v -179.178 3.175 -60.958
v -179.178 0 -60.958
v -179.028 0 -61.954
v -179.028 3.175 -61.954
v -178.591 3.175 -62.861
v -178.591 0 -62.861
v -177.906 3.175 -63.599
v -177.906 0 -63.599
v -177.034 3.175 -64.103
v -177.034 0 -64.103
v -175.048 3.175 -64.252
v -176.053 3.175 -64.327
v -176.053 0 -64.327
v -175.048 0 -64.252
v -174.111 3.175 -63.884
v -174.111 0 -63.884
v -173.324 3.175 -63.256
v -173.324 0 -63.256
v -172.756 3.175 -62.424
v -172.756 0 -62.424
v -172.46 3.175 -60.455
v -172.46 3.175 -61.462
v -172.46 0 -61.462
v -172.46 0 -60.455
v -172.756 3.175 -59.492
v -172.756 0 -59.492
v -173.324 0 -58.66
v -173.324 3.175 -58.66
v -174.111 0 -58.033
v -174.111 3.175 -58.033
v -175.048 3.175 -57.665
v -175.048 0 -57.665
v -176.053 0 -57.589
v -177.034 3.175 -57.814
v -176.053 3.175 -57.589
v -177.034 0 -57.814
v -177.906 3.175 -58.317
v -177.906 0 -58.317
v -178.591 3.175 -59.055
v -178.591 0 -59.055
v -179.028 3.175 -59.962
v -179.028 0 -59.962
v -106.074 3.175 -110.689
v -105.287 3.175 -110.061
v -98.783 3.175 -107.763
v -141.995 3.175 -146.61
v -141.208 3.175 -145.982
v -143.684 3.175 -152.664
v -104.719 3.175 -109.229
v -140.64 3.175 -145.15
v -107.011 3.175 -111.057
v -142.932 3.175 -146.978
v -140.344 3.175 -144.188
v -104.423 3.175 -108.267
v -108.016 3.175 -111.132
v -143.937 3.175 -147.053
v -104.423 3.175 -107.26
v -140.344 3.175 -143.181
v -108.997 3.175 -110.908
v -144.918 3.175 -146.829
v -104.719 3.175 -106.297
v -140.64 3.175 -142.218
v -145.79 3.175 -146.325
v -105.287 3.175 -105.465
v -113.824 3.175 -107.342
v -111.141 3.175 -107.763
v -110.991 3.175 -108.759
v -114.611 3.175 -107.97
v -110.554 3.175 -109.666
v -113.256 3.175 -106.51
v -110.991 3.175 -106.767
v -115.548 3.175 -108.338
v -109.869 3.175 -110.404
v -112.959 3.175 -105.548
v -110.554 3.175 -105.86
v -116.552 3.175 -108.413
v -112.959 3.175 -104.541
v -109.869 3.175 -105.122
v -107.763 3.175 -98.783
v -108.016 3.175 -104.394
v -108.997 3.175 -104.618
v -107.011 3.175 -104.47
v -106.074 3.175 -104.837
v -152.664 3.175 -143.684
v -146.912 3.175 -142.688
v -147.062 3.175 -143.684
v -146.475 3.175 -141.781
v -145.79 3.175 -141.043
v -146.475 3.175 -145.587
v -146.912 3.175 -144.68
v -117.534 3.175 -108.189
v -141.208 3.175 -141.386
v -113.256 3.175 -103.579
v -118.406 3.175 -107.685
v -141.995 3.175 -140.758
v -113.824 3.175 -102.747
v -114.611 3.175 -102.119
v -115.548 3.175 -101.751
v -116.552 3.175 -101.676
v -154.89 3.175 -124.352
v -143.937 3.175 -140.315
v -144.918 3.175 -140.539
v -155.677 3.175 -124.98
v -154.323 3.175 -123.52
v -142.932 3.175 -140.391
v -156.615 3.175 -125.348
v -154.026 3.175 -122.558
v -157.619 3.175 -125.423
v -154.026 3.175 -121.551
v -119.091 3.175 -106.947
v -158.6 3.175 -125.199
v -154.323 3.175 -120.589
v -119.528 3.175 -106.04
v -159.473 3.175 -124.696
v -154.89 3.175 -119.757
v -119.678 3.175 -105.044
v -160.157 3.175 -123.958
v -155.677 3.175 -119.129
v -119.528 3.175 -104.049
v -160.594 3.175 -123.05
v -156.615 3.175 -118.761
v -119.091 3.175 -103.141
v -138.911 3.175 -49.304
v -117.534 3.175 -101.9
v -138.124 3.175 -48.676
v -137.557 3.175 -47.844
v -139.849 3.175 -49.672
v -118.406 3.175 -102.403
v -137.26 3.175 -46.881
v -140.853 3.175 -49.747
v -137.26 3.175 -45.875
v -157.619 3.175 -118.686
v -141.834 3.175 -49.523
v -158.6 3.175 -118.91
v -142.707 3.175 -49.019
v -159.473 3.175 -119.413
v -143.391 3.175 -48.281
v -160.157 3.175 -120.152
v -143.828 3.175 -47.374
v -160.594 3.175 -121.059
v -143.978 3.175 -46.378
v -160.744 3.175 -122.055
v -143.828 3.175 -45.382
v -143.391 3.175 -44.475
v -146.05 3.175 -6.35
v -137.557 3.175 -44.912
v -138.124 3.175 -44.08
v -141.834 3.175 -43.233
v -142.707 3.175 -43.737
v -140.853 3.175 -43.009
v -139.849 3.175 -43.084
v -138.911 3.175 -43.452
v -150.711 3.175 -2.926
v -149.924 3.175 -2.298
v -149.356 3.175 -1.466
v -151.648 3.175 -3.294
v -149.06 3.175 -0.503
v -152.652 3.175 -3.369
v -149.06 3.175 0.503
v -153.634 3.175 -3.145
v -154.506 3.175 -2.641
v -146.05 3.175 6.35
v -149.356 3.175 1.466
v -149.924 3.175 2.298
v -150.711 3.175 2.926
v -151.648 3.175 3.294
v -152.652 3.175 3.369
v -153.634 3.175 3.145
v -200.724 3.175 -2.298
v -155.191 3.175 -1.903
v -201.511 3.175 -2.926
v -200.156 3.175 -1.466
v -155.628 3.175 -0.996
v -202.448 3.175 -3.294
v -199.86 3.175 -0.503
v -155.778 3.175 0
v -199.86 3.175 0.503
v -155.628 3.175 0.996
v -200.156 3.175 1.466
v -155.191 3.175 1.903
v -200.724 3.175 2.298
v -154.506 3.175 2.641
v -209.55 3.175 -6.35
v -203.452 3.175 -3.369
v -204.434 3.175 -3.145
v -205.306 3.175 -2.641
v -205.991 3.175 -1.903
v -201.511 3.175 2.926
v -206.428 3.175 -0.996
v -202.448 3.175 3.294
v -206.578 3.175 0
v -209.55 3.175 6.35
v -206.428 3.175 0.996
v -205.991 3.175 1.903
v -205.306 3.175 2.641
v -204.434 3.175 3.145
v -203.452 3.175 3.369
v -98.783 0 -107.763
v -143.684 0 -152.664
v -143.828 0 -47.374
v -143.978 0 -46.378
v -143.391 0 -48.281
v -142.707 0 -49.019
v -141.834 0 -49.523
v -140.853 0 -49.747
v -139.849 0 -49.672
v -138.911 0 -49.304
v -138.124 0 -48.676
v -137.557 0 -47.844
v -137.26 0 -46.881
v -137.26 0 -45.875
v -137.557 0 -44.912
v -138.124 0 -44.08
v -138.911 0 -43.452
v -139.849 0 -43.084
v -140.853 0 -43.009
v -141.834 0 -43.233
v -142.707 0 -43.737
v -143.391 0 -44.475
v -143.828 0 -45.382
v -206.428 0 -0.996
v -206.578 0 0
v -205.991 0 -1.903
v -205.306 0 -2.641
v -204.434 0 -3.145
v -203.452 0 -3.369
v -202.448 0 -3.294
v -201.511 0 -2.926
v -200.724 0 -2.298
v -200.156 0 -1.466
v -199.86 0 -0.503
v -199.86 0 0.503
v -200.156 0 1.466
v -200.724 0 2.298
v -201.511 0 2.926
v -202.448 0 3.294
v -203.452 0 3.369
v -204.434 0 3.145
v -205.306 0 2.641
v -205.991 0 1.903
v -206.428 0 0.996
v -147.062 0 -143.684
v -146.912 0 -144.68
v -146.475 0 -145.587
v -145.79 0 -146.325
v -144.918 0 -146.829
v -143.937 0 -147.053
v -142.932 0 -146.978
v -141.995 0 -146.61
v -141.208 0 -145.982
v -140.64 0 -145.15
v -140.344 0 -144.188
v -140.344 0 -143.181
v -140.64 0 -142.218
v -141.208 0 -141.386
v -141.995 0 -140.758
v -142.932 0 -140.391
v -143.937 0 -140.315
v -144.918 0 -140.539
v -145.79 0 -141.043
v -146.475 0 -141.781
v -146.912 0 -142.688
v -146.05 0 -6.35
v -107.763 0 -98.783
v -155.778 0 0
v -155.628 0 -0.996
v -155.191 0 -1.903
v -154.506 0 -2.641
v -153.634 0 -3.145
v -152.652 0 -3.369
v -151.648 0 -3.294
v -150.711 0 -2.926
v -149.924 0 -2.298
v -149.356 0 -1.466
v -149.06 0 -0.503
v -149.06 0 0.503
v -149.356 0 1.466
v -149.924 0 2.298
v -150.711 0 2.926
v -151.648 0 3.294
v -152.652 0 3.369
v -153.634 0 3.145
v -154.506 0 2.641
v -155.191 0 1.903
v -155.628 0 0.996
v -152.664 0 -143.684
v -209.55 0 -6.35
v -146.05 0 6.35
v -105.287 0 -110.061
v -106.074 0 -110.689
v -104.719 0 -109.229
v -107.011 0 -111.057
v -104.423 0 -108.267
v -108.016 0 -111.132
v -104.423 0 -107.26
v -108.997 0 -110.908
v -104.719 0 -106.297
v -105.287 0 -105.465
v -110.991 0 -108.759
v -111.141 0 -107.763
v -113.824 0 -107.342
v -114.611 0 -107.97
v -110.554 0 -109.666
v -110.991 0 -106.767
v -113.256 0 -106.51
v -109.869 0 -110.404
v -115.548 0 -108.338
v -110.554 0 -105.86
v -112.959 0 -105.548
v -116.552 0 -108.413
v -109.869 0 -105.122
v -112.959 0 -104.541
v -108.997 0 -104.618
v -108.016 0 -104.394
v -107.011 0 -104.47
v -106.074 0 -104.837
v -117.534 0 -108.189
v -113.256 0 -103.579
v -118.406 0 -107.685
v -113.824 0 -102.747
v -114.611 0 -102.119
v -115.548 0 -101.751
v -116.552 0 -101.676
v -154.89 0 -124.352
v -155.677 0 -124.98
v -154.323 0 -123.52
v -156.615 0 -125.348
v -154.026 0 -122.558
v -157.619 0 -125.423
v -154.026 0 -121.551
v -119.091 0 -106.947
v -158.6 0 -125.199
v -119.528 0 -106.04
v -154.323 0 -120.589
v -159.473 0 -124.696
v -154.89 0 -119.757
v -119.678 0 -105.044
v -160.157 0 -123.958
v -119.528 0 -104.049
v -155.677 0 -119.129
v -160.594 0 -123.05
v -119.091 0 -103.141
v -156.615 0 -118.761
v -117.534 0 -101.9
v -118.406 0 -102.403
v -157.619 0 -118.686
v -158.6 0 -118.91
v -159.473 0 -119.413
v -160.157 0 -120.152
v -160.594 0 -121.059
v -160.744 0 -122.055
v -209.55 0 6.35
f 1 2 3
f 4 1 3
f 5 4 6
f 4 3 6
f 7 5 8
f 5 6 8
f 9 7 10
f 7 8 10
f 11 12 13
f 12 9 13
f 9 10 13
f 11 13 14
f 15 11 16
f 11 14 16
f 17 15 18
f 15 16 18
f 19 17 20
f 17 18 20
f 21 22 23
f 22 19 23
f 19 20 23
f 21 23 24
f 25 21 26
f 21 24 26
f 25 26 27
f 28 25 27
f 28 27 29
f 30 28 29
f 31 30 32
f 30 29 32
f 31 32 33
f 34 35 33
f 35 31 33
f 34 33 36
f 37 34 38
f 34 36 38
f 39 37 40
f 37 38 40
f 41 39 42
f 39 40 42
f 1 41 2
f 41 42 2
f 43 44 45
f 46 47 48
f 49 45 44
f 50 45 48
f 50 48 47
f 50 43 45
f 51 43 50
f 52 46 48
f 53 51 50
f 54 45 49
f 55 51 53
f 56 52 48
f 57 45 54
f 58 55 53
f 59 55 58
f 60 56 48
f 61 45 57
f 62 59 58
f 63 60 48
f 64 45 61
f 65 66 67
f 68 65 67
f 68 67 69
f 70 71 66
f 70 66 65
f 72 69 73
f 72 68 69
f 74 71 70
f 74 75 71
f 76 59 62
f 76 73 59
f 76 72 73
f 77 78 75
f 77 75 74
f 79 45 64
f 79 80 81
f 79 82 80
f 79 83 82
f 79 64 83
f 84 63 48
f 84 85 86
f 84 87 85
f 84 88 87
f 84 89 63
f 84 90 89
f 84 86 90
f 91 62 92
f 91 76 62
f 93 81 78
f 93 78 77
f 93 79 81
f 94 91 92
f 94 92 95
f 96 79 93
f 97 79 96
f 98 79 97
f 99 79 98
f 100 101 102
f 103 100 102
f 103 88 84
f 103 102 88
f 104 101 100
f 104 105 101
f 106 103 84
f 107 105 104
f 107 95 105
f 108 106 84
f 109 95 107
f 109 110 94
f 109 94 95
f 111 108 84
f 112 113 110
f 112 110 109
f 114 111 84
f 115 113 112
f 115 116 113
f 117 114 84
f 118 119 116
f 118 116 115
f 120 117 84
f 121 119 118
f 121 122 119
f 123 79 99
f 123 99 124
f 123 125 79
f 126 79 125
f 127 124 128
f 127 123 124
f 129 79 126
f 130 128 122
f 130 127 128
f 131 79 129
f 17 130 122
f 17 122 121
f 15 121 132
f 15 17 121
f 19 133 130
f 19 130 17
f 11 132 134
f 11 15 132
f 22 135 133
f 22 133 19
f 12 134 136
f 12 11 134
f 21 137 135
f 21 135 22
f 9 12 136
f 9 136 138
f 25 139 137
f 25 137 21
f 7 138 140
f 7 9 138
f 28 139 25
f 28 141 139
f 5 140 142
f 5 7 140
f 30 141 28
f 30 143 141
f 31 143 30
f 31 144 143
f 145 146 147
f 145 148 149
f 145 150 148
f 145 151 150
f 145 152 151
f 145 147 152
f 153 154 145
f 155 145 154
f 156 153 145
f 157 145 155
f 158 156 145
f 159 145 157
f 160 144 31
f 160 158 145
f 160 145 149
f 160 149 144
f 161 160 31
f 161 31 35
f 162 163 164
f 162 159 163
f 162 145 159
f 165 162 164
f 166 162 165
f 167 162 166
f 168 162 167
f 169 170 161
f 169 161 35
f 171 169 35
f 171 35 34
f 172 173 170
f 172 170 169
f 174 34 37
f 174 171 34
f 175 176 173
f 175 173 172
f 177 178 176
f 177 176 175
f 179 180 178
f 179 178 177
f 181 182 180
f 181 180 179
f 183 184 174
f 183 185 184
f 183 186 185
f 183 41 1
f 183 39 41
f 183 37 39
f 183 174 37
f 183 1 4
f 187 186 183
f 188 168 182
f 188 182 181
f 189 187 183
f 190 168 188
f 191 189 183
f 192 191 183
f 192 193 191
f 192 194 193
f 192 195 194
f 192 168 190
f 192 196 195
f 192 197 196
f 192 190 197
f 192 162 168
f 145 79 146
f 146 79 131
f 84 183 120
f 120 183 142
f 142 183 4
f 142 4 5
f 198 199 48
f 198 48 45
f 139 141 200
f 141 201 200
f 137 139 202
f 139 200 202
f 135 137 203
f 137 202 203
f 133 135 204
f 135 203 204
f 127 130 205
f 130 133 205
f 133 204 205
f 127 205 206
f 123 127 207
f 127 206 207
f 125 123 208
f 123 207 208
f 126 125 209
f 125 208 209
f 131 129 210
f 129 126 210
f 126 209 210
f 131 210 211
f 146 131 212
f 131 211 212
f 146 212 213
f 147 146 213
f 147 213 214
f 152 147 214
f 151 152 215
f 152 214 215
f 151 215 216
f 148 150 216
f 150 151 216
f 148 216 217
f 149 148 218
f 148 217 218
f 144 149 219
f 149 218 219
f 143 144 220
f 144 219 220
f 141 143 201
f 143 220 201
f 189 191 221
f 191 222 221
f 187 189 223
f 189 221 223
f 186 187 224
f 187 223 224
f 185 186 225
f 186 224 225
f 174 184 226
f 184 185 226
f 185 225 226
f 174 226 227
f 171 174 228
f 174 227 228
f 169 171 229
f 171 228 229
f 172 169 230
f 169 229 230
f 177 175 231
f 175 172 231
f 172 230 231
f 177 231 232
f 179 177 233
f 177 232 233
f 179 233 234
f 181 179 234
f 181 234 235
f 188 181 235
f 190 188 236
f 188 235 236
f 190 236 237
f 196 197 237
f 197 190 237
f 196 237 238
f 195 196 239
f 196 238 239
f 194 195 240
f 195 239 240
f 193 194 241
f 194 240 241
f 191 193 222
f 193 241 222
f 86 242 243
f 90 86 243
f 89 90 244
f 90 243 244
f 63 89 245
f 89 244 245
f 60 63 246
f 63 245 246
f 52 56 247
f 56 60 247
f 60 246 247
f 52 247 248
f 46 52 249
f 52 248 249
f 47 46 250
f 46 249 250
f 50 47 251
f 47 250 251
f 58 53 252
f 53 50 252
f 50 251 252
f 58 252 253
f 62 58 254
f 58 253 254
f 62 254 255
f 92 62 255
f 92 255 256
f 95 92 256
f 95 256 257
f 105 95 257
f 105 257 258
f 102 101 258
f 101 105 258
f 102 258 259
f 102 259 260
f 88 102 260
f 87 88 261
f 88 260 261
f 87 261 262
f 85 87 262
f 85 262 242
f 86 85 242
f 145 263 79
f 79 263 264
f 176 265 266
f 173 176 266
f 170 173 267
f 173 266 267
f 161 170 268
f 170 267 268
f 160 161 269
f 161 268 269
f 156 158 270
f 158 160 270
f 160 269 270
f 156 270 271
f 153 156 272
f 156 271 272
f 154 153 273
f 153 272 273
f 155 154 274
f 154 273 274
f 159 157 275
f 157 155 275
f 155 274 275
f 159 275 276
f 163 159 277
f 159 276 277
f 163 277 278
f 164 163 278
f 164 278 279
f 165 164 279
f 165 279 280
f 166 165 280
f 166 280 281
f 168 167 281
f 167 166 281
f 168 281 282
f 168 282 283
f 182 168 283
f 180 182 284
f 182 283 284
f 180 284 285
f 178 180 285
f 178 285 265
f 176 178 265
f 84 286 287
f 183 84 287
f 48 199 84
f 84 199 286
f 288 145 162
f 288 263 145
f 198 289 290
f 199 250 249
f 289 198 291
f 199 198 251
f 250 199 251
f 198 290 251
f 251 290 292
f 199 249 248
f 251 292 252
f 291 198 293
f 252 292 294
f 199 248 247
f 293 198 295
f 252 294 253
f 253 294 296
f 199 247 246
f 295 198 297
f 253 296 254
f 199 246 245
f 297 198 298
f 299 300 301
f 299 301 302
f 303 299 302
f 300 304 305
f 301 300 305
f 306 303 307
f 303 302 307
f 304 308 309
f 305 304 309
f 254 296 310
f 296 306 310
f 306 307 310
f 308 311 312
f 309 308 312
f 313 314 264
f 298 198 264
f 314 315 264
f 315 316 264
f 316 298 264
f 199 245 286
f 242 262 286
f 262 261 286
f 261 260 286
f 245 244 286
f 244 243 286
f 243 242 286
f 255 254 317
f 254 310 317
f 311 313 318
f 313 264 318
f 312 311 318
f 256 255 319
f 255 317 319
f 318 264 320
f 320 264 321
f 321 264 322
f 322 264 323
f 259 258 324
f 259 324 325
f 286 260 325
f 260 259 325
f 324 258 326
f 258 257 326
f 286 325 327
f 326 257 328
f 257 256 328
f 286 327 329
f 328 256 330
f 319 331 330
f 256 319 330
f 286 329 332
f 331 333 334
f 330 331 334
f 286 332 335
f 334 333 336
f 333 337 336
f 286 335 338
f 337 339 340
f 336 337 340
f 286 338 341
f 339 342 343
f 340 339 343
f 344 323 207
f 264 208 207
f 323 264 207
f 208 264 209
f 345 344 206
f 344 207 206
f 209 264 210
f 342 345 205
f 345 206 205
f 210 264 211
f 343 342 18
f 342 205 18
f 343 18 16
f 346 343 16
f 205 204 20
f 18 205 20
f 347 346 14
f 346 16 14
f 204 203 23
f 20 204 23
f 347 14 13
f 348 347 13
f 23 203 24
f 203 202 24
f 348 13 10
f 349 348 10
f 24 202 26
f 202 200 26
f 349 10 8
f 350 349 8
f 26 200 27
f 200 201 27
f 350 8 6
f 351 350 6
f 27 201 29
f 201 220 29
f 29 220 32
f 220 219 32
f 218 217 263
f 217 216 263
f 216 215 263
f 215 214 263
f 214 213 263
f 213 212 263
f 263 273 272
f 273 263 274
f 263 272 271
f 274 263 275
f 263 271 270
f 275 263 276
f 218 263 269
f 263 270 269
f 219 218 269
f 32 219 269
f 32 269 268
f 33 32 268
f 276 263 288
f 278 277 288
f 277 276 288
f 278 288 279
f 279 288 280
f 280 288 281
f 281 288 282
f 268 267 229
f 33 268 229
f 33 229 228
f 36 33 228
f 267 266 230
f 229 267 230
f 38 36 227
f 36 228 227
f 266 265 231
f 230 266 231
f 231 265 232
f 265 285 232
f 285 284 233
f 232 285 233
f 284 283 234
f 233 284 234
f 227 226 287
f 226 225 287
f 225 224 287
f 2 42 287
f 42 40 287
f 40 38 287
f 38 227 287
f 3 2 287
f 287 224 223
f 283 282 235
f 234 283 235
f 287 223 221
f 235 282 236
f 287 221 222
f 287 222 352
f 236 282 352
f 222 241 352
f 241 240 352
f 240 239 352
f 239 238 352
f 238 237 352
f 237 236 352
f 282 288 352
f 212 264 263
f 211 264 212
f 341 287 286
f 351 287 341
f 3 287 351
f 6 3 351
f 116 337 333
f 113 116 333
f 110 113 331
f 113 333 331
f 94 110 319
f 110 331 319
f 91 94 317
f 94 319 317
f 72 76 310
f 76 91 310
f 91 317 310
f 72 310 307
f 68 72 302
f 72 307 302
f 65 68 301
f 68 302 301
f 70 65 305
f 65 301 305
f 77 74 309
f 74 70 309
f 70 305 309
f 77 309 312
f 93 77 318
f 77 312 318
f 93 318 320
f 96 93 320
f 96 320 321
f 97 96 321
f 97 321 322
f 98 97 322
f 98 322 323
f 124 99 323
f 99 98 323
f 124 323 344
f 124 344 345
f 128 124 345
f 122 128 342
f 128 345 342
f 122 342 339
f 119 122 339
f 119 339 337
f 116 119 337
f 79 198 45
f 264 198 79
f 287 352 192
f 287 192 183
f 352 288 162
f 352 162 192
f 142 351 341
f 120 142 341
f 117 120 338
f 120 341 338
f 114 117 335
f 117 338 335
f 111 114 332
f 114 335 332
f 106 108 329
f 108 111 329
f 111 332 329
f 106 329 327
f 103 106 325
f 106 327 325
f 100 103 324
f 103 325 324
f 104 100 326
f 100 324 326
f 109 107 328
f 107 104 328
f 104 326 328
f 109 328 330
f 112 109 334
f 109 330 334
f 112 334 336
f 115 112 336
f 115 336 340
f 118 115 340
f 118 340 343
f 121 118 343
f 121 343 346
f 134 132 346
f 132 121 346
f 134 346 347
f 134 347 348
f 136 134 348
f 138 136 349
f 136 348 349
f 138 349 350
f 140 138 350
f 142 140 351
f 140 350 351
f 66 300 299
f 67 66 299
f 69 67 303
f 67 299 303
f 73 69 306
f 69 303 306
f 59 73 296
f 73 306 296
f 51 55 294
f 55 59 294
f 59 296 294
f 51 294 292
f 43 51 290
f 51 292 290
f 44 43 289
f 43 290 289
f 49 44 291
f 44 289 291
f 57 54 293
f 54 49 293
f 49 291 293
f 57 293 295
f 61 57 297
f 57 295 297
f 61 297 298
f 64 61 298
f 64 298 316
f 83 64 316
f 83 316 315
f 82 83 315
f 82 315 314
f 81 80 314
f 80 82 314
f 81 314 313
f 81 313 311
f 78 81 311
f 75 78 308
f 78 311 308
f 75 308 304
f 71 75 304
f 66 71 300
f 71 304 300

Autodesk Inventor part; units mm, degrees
ref_plane "YZ Plane" through (0, 0, 0) normal (1, 0, 0) x (0, 1, 0)
ref_plane "XZ Plane" through (0, 0, 0) normal (0, 1, 0) x (-1, 0, 0)
ref_plane "XY Plane" through (0, 0, 0) normal (0, 0, 1) x (1, 0, 0)
sketch "Sketch1" plane through (0, 0, 0) normal (0, 1, 0) x (-1, 0, 0)
  circle A0 centre (0, 0) radius 152.4 construction
  circle A1 centre (0, 0) radius 203.2 construction
  line L0 (0, 0) -> (0, -94.5056)
  line L1 (0, 0) -> (255.4804, -255.4804) construction
  circle A2 centre (152.4, 0) radius 3.3782
  circle A3 centre (203.2, 0) radius 3.3782
  circle A4 centre (107.7631, -107.7631) radius 3.3782
  circle A5 centre (143.6841, -143.6841) radius 3.3782
  line L2 (250.9903, -259.9706) -> (8.0112, -16.9915)
  line L3 (143.6841, -152.6644) -> (152.6644, -143.6841)
  line L4 (98.7828, -107.7631) -> (107.7631, -98.7828)
  line L5 (146.05, 6.35) -> (209.55, 6.35)
  line L6 (209.55, 6.35) -> (209.55, -6.35)
  line L7 (146.05, -6.35) -> (146.05, 6.35)
  line L8 (152.6644, -143.6841) -> (209.55, -6.35)
  line L9 (146.05, -6.35) -> (107.7631, -98.7828)
  circle A6 centre (175.8001, -60.9582) radius 3.3782
  circle A7 centre (157.3663, -122.0546) radius 3.3782
  circle A8 centre (140.6003, -46.378) radius 3.3782
  circle A9 centre (116.2999, -105.0443) radius 3.3782
  dimension "d34" = 304.8
  dimension "d36" = 406.4
  dimension "d38" = 45
  dimension "d40" = 6.7564
  dimension "d41" = 6.7564
  dimension "d42" = 6.7564
  dimension "d43" = 6.7564
  dimension "d44" = 6.35
  dimension "d45" = 6.35
  dimension "d46" = 6.35
  dimension "d48" = 6.35
  dimension "d49" = 6.35
  dimension "d51" = 6.35
  dimension "d52" = 6.35
  dimension "d53" = 157.5
  dimension "d58" = 6.7564
  dimension "d59" = 6.7564
  dimension "d64" = 6.7564
  dimension "d70" = 6.7564
  dimension "d72" = 63.5
ref_plane "Work Plane1" through (0, 3.175, 0) normal (0, 1, 0) x (1, 0, 0)
extrude "Extrusion5" add sketch "Sketch1" along normal blind 3.175
properties part number "Extender Mounting Plate"
